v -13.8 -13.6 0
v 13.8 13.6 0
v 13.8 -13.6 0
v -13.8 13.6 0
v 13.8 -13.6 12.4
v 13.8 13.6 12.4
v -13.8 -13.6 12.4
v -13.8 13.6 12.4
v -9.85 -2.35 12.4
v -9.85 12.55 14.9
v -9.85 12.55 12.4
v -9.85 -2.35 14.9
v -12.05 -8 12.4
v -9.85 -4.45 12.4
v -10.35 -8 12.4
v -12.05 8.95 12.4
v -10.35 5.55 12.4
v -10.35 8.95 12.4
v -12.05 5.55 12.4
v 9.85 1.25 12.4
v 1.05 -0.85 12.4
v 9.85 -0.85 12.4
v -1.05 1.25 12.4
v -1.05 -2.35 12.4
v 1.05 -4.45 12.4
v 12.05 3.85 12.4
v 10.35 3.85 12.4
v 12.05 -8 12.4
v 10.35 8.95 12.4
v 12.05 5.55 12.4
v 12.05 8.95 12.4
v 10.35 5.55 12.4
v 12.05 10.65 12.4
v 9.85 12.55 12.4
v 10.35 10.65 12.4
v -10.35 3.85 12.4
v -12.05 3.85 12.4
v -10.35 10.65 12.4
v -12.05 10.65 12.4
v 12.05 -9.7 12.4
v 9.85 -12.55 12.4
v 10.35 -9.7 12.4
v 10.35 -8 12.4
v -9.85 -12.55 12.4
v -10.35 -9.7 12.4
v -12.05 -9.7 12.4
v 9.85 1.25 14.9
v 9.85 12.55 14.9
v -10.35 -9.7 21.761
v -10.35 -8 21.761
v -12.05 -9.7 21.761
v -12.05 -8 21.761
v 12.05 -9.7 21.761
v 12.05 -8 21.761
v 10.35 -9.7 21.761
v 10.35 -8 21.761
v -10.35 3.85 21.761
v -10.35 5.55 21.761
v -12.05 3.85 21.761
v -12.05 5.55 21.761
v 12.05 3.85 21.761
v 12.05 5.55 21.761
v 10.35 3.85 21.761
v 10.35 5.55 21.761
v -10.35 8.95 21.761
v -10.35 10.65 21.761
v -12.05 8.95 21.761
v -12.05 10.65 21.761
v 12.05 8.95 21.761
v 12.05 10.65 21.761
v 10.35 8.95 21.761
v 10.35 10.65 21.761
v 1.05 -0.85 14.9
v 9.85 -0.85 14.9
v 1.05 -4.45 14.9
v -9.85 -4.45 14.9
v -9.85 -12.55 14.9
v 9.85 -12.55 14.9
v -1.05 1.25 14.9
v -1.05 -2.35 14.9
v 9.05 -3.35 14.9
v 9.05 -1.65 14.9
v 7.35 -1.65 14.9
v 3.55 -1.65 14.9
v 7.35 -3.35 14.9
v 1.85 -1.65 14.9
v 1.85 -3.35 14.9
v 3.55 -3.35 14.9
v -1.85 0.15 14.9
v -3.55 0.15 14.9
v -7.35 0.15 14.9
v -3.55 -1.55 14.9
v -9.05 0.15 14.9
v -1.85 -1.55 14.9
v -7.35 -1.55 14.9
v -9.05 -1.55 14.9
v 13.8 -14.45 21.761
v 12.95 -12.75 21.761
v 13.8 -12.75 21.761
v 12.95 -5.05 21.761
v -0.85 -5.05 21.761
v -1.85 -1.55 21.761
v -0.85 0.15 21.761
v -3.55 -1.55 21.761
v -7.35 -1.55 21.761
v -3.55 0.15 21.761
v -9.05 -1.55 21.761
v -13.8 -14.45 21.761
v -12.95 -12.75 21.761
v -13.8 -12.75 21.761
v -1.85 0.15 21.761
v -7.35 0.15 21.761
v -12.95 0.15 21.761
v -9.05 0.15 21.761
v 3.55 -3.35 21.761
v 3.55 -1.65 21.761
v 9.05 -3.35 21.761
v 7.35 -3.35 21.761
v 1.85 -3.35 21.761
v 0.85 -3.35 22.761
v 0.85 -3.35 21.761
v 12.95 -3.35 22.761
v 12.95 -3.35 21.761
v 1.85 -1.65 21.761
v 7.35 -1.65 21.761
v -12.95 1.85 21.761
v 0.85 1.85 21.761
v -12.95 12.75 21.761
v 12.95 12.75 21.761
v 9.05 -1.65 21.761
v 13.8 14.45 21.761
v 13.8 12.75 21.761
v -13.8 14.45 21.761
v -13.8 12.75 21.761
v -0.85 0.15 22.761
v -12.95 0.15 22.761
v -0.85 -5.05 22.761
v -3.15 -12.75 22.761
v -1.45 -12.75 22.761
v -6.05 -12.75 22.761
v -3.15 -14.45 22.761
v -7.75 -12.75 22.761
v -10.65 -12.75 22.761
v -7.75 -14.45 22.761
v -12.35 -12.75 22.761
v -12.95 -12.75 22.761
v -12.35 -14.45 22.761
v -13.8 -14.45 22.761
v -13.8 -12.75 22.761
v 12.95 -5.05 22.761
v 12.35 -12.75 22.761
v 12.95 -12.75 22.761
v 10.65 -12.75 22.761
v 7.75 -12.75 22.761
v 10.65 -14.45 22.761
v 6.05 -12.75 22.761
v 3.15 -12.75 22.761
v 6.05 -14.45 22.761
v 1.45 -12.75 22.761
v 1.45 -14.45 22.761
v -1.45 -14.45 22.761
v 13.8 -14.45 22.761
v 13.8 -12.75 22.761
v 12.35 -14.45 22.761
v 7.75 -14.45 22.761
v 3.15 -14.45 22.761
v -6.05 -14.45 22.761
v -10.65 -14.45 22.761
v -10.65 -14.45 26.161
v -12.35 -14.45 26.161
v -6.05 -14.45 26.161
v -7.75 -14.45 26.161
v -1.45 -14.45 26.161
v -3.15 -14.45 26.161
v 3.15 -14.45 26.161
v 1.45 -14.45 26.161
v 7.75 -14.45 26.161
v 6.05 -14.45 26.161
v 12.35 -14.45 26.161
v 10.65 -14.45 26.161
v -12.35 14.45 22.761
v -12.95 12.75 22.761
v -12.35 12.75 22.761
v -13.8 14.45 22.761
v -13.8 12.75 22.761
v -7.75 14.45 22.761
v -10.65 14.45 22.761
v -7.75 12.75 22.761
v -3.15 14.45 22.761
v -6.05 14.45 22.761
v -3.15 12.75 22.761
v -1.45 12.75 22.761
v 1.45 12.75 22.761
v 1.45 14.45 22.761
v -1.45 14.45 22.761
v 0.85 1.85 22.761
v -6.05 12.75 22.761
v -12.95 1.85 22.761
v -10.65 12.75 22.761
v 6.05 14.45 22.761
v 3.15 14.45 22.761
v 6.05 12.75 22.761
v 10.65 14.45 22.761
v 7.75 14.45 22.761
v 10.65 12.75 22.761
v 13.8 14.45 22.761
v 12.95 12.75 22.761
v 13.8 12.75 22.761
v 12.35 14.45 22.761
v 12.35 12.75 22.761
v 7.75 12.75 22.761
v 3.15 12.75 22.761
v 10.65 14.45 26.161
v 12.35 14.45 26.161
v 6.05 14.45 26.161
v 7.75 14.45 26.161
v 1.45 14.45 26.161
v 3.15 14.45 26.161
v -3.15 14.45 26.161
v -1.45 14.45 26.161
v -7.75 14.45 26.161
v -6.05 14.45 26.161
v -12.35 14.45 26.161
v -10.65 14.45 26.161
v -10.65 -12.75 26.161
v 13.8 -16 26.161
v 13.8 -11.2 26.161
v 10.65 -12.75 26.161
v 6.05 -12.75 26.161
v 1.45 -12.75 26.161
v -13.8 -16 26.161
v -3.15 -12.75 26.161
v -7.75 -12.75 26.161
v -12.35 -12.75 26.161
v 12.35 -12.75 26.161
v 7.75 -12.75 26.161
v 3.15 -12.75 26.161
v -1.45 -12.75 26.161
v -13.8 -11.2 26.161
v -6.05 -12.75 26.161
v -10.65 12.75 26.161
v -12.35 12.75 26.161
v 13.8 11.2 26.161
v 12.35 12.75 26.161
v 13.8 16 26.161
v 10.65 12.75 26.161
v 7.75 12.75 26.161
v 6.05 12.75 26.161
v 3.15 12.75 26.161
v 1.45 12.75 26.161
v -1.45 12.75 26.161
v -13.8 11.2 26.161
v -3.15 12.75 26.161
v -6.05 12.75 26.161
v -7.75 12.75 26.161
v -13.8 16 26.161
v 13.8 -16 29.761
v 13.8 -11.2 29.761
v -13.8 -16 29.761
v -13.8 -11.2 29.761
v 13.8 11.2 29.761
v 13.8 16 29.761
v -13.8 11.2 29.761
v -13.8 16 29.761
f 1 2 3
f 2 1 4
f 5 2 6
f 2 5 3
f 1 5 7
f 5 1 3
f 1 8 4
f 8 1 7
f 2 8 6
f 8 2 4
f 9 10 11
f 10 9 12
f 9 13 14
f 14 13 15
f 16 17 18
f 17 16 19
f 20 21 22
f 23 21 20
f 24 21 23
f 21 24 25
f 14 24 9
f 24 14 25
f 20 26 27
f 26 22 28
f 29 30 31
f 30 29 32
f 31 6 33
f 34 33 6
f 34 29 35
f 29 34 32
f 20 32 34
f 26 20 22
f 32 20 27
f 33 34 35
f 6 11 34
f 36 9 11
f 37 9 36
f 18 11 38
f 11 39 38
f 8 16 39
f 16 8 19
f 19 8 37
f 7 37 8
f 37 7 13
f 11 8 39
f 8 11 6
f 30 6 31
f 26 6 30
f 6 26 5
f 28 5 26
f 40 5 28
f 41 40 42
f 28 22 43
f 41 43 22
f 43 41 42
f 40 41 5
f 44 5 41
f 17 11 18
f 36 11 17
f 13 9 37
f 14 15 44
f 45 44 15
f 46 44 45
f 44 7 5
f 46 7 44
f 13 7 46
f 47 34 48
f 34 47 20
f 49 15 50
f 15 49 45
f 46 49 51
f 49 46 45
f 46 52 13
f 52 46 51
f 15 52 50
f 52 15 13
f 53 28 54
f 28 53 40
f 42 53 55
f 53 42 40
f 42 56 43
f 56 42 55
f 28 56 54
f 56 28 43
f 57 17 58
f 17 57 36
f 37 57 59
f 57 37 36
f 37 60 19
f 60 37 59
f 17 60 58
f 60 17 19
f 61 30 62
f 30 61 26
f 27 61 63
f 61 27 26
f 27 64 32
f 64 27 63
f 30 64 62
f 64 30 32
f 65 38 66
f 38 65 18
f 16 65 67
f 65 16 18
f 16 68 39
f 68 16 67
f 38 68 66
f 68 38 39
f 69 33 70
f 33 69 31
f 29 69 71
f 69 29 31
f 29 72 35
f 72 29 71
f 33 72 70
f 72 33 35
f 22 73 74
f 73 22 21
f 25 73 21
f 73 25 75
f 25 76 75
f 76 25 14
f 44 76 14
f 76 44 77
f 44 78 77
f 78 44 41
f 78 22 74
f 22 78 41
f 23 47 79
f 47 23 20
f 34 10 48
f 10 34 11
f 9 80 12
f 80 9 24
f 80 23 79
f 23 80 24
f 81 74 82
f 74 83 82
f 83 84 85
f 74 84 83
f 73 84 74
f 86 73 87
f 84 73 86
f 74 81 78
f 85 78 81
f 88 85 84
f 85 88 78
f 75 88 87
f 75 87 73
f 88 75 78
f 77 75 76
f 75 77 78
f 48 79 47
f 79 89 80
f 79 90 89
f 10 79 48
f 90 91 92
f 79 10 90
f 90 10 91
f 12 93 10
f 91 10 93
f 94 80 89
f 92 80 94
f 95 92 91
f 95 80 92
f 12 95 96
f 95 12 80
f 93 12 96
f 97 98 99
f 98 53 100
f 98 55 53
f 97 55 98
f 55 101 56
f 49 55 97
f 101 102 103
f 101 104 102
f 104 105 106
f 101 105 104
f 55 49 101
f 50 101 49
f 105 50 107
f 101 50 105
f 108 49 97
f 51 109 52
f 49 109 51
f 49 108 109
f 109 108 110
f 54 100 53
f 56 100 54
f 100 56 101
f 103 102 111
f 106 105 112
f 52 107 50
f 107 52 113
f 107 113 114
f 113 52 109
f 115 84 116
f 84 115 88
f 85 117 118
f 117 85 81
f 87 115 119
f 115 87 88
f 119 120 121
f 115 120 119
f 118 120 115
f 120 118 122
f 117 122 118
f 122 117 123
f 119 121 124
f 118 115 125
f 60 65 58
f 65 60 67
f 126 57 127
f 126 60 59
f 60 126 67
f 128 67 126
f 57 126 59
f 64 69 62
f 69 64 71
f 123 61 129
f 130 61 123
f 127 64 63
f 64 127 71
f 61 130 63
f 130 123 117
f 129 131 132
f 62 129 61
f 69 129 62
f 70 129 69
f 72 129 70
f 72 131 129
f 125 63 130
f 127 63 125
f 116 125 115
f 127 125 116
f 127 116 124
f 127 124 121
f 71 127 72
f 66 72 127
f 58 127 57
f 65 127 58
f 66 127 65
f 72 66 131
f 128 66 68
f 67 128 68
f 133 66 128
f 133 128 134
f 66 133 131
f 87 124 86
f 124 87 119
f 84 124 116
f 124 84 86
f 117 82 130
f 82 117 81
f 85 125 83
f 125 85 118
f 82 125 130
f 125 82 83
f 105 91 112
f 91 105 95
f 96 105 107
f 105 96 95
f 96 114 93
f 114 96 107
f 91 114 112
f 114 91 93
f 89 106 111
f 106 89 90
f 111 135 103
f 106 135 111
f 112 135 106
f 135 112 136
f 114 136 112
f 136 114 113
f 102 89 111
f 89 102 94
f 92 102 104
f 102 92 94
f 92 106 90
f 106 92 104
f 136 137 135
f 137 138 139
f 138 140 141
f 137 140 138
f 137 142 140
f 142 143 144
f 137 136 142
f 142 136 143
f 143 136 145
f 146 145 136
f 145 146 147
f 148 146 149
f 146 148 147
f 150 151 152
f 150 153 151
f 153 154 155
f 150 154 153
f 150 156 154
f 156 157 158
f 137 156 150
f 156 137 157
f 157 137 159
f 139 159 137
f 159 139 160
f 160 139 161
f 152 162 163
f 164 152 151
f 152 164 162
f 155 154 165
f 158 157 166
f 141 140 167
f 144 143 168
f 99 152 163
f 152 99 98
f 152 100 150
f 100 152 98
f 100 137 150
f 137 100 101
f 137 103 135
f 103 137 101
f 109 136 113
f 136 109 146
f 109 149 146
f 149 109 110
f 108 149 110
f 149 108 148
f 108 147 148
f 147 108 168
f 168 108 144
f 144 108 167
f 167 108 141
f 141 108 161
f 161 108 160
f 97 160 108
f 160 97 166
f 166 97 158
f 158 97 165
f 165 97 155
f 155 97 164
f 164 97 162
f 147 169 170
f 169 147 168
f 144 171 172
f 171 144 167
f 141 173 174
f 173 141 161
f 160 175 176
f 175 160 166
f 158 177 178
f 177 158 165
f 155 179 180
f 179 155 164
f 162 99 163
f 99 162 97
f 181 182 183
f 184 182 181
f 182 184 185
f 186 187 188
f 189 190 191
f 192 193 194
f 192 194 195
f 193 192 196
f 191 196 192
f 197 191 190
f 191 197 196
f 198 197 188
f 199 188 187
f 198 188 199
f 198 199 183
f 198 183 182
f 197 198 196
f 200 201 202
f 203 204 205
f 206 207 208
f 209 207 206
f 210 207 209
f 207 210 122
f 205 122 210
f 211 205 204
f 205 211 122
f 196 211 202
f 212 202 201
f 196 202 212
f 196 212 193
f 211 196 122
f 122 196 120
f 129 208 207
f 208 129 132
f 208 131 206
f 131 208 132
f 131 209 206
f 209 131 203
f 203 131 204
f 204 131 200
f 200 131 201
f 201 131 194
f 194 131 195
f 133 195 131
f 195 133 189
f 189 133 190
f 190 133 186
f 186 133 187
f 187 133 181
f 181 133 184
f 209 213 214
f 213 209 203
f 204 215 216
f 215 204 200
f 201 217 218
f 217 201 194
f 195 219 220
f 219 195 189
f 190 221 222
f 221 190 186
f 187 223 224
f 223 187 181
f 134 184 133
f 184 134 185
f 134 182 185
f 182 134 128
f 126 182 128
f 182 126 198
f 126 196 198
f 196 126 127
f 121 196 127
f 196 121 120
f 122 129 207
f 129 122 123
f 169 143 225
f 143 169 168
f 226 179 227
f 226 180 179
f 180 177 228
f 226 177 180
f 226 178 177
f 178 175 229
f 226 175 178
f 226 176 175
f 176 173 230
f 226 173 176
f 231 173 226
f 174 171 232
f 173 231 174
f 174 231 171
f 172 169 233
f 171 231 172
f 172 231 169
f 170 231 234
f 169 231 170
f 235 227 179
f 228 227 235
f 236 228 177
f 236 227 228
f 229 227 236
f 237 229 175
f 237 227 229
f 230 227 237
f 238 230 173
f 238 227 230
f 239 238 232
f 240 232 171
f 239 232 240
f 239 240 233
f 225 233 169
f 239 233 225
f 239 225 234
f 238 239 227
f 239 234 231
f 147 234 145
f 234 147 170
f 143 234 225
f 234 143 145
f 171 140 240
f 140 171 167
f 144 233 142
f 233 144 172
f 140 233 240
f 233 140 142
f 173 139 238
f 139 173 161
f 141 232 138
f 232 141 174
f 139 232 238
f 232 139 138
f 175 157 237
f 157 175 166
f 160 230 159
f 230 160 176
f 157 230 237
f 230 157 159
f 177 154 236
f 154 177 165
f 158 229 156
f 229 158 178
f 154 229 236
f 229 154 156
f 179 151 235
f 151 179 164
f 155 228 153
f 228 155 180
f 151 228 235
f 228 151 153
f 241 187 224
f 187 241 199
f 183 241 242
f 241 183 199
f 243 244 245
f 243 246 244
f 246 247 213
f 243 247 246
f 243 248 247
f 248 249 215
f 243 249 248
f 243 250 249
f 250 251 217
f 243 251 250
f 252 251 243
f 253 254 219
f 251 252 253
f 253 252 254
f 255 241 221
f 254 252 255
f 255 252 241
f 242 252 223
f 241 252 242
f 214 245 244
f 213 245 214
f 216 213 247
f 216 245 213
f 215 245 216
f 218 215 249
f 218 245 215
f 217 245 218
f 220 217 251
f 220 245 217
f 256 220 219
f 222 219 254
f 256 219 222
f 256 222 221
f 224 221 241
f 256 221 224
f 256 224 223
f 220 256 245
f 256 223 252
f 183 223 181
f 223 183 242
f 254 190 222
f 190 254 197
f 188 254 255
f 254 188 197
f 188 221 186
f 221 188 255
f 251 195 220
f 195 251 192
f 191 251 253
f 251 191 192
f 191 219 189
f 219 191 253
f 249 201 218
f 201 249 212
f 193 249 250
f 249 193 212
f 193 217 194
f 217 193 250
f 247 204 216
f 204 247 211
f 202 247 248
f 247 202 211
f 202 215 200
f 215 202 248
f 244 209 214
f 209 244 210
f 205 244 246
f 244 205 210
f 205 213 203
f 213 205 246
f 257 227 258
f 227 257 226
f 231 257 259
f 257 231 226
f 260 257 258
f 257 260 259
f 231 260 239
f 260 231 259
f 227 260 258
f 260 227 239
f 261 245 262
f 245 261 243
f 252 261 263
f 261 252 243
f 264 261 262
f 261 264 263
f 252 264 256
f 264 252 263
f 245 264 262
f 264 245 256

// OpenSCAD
// Generated by SolidPython 0.4.2 on 2020-09-29 23:20:26
//!OpenSCAD

scale(v = 0.0100000000) {
	translate(v = [-1380, -1360, 0]) {
		union() {
			color(c = [0.4000000000, 0.4000000000, 0.4000000000]) {
				translate(v = [0, 0, 0]) {
					linear_extrude(height = 1000.0000000000) {
						polygon(paths = [[0, 1, 2, 3]], points = [[0, 0], [0, 2720], [2760, 2720], [2760, 0]]);
					}
				}
			}
			color(c = [0.2000000000, 0.6000000000, 0.2000000000]) {
				translate(v = [0, 0, 1000.0000000000]) {
					linear_extrude(height = 120.0000000000) {
						polygon(paths = [[0, 1, 2, 3]], points = [[0, 1305], [0, 2720], [2760, 2720], [2760, 1305]]);
					}
				}
			}
			color(c = [0.4000000000, 0.4000000000, 0.4000000000]) {
				translate(v = [0, 0, 1000.0000000000]) {
					linear_extrude(height = 120.0000000000) {
						polygon(paths = [[0, 1, 2, 3]], points = [[0, 0], [0, 1305], [2760, 1305], [2760, 0]]);
					}
				}
			}
			color(c = [0.9000000000, 0.6000000000, 0.6000000000]) {
				translate(v = [0, 0, 1120.0000000000]) {
					linear_extrude(height = 120.0000000000) {
						polygon(paths = [[0, 1, 2, 3]], points = [[135, 1615], [135, 2485], [395, 2485], [395, 1615]]);
					}
				}
			}
			color(c = [0.9000000000, 0.6000000000, 0.6000000000]) {
				translate(v = [0, 0, 1120.0000000000]) {
					linear_extrude(height = 120.0000000000) {
						polygon(paths = [[0, 1, 2, 3]], points = [[2365, 1615], [2365, 2485], [2625, 2485], [2625, 1615]]);
					}
				}
			}
			color(c = [0.9000000000, 0.6000000000, 0.9000000000]) {
				translate(v = [0, 0, 1120.0000000000]) {
					linear_extrude(height = 120.0000000000) {
						polygon(paths = [[0, 1, 2, 3]], points = [[135, 235], [135, 785], [395, 785], [395, 235]]);
					}
				}
			}
			color(c = [0.9000000000, 0.6000000000, 0.9000000000]) {
				translate(v = [0, 0, 1120.0000000000]) {
					linear_extrude(height = 120.0000000000) {
						polygon(paths = [[0, 1, 2, 3]], points = [[2365, 235], [2365, 785], [2625, 785], [2625, 235]]);
					}
				}
			}
			color(c = [0.2000000000, 0.6000000000, 0.2000000000]) {
				translate(v = [0, 0, 1120.0000000000]) {
					linear_extrude(height = 120.0000000000) {
						difference() {
							polygon(paths = [[0, 1, 2, 3]], points = [[0, 1305], [0, 2720], [2760, 2720], [2760, 1305]]);
							polygon(paths = [[0, 1, 2, 3]], points = [[135, 1615], [395, 1615], [395, 2485], [135, 2485]]);
							polygon(paths = [[0, 1, 2, 3]], points = [[2365, 1615], [2625, 1615], [2625, 2485], [2365, 2485]]);
						}
					}
				}
			}
			color(c = [0.4000000000, 0.4000000000, 0.4000000000]) {
				translate(v = [0, 0, 1120.0000000000]) {
					linear_extrude(height = 120.0000000000) {
						difference() {
							polygon(paths = [[0, 1, 2, 3]], points = [[0, 0], [0, 1305], [2760, 1305], [2760, 0]]);
							polygon(paths = [[0, 1, 2, 3]], points = [[135, 235], [395, 235], [395, 785], [135, 785]]);
							polygon(paths = [[0, 1, 2, 3]], points = [[2365, 235], [2625, 235], [2625, 785], [2365, 785]]);
						}
					}
				}
			}
			color(c = [0.1000000000, 0.1000000000, 0.1000000000]) {
				translate(v = [0, 0, 1240.0000000000]) {
					linear_extrude(height = 70.0000000000) {
						polygon(paths = [[0, 1, 2, 3]], points = [[175, 390], [175, 560], [345, 560], [345, 390]]);
					}
				}
			}
			color(c = [0.1000000000, 0.1000000000, 0.1000000000]) {
				translate(v = [0, 0, 1240.0000000000]) {
					linear_extrude(height = 70.0000000000) {
						polygon(paths = [[0, 1, 2, 3]], points = [[2415, 390], [2415, 560], [2585, 560], [2585, 390]]);
					}
				}
			}
			color(c = [0.1000000000, 0.1000000000, 0.1000000000]) {
				translate(v = [0, 0, 1240.0000000000]) {
					linear_extrude(height = 70.0000000000) {
						polygon(paths = [[0, 1, 2, 3]], points = [[175, 1745], [175, 1915], [345, 1915], [345, 1745]]);
					}
				}
			}
			color(c = [0.1000000000, 0.1000000000, 0.1000000000]) {
				translate(v = [0, 0, 1240.0000000000]) {
					linear_extrude(height = 70.0000000000) {
						polygon(paths = [[0, 1, 2, 3]], points = [[2415, 1745], [2415, 1915], [2585, 1915], [2585, 1745]]);
					}
				}
			}
			color(c = [0.1000000000, 0.1000000000, 0.1000000000]) {
				translate(v = [0, 0, 1240.0000000000]) {
					linear_extrude(height = 70.0000000000) {
						polygon(paths = [[0, 1, 2, 3]], points = [[175, 2255], [175, 2425], [345, 2425], [345, 2255]]);
					}
				}
			}
			color(c = [0.1000000000, 0.1000000000, 0.1000000000]) {
				translate(v = [0, 0, 1240.0000000000]) {
					linear_extrude(height = 70.0000000000) {
						polygon(paths = [[0, 1, 2, 3]], points = [[2415, 2255], [2415, 2425], [2585, 2425], [2585, 2255]]);
					}
				}
			}
			color(c = [1.0000000000, 1.0000000000, 1.0000000000]) {
				translate(v = [0, 0, 1240.0000000000]) {
					linear_extrude(height = 70.0000000000) {
						polygon(paths = [[0, 1, 2, 3, 4, 5]], points = [[395, 105], [395, 915], [1485, 915], [1485, 1275], [2365, 1275], [2365, 105]]);
					}
				}
			}
			color(c = [1.0000000000, 1.0000000000, 1.0000000000]) {
				translate(v = [0, 0, 1240.0000000000]) {
					linear_extrude(height = 70.0000000000) {
						polygon(paths = [[0, 1, 2, 3, 4, 5]], points = [[395, 1125], [395, 2615], [2365, 2615], [2365, 1485], [1275, 1485], [1275, 1125]]);
					}
				}
			}
			color(c = [0.1000000000, 0.1000000000, 0.1000000000]) {
				translate(v = [0, 0, 1310.0000000000]) {
					linear_extrude(height = 180.0000000000) {
						polygon(paths = [[0, 1, 2, 3]], points = [[175, 390], [175, 560], [345, 560], [345, 390]]);
					}
				}
			}
			color(c = [0.1000000000, 0.1000000000, 0.1000000000]) {
				translate(v = [0, 0, 1310.0000000000]) {
					linear_extrude(height = 180.0000000000) {
						polygon(paths = [[0, 1, 2, 3]], points = [[2415, 390], [2415, 560], [2585, 560], [2585, 390]]);
					}
				}
			}
			color(c = [0.1000000000, 0.1000000000, 0.1000000000]) {
				translate(v = [0, 0, 1310.0000000000]) {
					linear_extrude(height = 180.0000000000) {
						polygon(paths = [[0, 1, 2, 3]], points = [[175, 1745], [175, 1915], [345, 1915], [345, 1745]]);
					}
				}
			}
			color(c = [0.1000000000, 0.1000000000, 0.1000000000]) {
				translate(v = [0, 0, 1310.0000000000]) {
					linear_extrude(height = 180.0000000000) {
						polygon(paths = [[0, 1, 2, 3]], points = [[2415, 1745], [2415, 1915], [2585, 1915], [2585, 1745]]);
					}
				}
			}
			color(c = [0.1000000000, 0.1000000000, 0.1000000000]) {
				translate(v = [0, 0, 1310.0000000000]) {
					linear_extrude(height = 180.0000000000) {
						polygon(paths = [[0, 1, 2, 3]], points = [[175, 2255], [175, 2425], [345, 2425], [345, 2255]]);
					}
				}
			}
			color(c = [0.1000000000, 0.1000000000, 0.1000000000]) {
				translate(v = [0, 0, 1310.0000000000]) {
					linear_extrude(height = 180.0000000000) {
						polygon(paths = [[0, 1, 2, 3]], points = [[2415, 2255], [2415, 2425], [2585, 2425], [2585, 2255]]);
					}
				}
			}
			color(c = [0.7000000000, 0, 0]) {
				translate(v = [0, 0, 1310.0000000000]) {
					linear_extrude(height = 180.0000000000) {
						polygon(paths = [[0, 1, 2, 3, 4, 5]], points = [[395, 105], [395, 915], [1485, 915], [1485, 1275], [2365, 1275], [2365, 105]]);
					}
				}
			}
			color(c = [0.7000000000, 0, 0]) {
				translate(v = [0, 0, 1310.0000000000]) {
					linear_extrude(height = 180.0000000000) {
						polygon(paths = [[0, 1, 2, 3, 4, 5]], points = [[395, 1125], [395, 2615], [2365, 2615], [2365, 1485], [1275, 1485], [1275, 1125]]);
					}
				}
			}
			color(c = [0.1000000000, 0.1000000000, 0.1000000000]) {
				translate(v = [0, 0, 1490.0000000000]) {
					linear_extrude(height = 686.1000000000) {
						polygon(paths = [[0, 1, 2, 3]], points = [[175, 390], [175, 560], [345, 560], [345, 390]]);
					}
				}
			}
			color(c = [0.1000000000, 0.1000000000, 0.1000000000]) {
				translate(v = [0, 0, 1490.0000000000]) {
					linear_extrude(height = 686.1000000000) {
						polygon(paths = [[0, 1, 2, 3]], points = [[2415, 390], [2415, 560], [2585, 560], [2585, 390]]);
					}
				}
			}
			color(c = [0.1000000000, 0.1000000000, 0.1000000000]) {
				translate(v = [0, 0, 1490.0000000000]) {
					linear_extrude(height = 686.1000000000) {
						polygon(paths = [[0, 1, 2, 3]], points = [[1565, 1025], [1565, 1195], [1735, 1195], [1735, 1025]]);
					}
				}
			}
			color(c = [0.1000000000, 0.1000000000, 0.1000000000]) {
				translate(v = [0, 0, 1490.0000000000]) {
					linear_extrude(height = 686.1000000000) {
						polygon(paths = [[0, 1, 2, 3]], points = [[2115, 1025], [2115, 1195], [2285, 1195], [2285, 1025]]);
					}
				}
			}
			color(c = [0.1000000000, 0.1000000000, 0.1000000000]) {
				translate(v = [0, 0, 1490.0000000000]) {
					linear_extrude(height = 686.1000000000) {
						polygon(paths = [[0, 1, 2, 3]], points = [[475, 1205], [475, 1375], [645, 1375], [645, 1205]]);
					}
				}
			}
			color(c = [0.1000000000, 0.1000000000, 0.1000000000]) {
				translate(v = [0, 0, 1490.0000000000]) {
					linear_extrude(height = 686.1000000000) {
						polygon(paths = [[0, 1, 2, 3]], points = [[1025, 1205], [1025, 1375], [1195, 1375], [1195, 1205]]);
					}
				}
			}
			color(c = [0.1000000000, 0.1000000000, 0.1000000000]) {
				translate(v = [0, 0, 1490.0000000000]) {
					linear_extrude(height = 686.1000000000) {
						polygon(paths = [[0, 1, 2, 3]], points = [[175, 1745], [175, 1915], [345, 1915], [345, 1745]]);
					}
				}
			}
			color(c = [0.1000000000, 0.1000000000, 0.1000000000]) {
				translate(v = [0, 0, 1490.0000000000]) {
					linear_extrude(height = 686.1000000000) {
						polygon(paths = [[0, 1, 2, 3]], points = [[2415, 1745], [2415, 1915], [2585, 1915], [2585, 1745]]);
					}
				}
			}
			color(c = [0.1000000000, 0.1000000000, 0.1000000000]) {
				translate(v = [0, 0, 1490.0000000000]) {
					linear_extrude(height = 686.1000000000) {
						polygon(paths = [[0, 1, 2, 3]], points = [[175, 2255], [175, 2425], [345, 2425], [345, 2255]]);
					}
				}
			}
			color(c = [0.1000000000, 0.1000000000, 0.1000000000]) {
				translate(v = [0, 0, 1490.0000000000]) {
					linear_extrude(height = 686.1000000000) {
						polygon(paths = [[0, 1, 2, 3]], points = [[2415, 2255], [2415, 2425], [2585, 2425], [2585, 2255]]);
					}
				}
			}
			color(c = [0.9000000000, 0.6000000000, 0.6000000000]) {
				translate(v = [0, 0, 2176.1000000000]) {
					linear_extrude(height = 100.0000000000) {
						polygon(paths = [[0, 1, 2, 3, 4, 5, 6, 7, 8, 9]], points = [[0, -85], [0, 85], [85, 85], [85, 1375], [1295, 1375], [1295, 855], [2675, 855], [2675, 85], [2760, 85], [2760, -85]]);
					}
				}
			}
			color(c = [0.9000000000, 0.6000000000, 0.6000000000]) {
				translate(v = [0, 0, 2176.1000000000]) {
					linear_extrude(height = 100.0000000000) {
						polygon(paths = [[0, 1, 2, 3, 4, 5, 6, 7, 8, 9]], points = [[1465, 1025], [1465, 1545], [85, 1545], [85, 2635], [0, 2635], [0, 2805], [2760, 2805], [2760, 2635], [2675, 2635], [2675, 1025]]);
					}
				}
			}
			color(c = [0.5000000000, 0.5000000000, 0.5000000000]) {
				translate(v = [0, 0, 2276.1000000000]) {
					linear_extrude(height = 340.0000000000) {
						polygon(paths = [[0, 1, 2, 3]], points = [[145, -85], [145, 85], [315, 85], [315, -85]]);
					}
				}
			}
			color(c = [0.5000000000, 0.5000000000, 0.5000000000]) {
				translate(v = [0, 0, 2276.1000000000]) {
					linear_extrude(height = 340.0000000000) {
						polygon(paths = [[0, 1, 2, 3]], points = [[605, -85], [605, 85], [775, 85], [775, -85]]);
					}
				}
			}
			color(c = [0.5000000000, 0.5000000000, 0.5000000000]) {
				translate(v = [0, 0, 2276.1000000000]) {
					linear_extrude(height = 340.0000000000) {
						polygon(paths = [[0, 1, 2, 3]], points = [[1065, -85], [1065, 85], [1235, 85], [1235, -85]]);
					}
				}
			}
			color(c = [0.5000000000, 0.5000000000, 0.5000000000]) {
				translate(v = [0, 0, 2276.1000000000]) {
					linear_extrude(height = 340.0000000000) {
						polygon(paths = [[0, 1, 2, 3]], points = [[1525, -85], [1525, 85], [1695, 85], [1695, -85]]);
					}
				}
			}
			color(c = [0.5000000000, 0.5000000000, 0.5000000000]) {
				translate(v = [0, 0, 2276.1000000000]) {
					linear_extrude(height = 340.0000000000) {
						polygon(paths = [[0, 1, 2, 3]], points = [[1985, -85], [1985, 85], [2155, 85], [2155, -85]]);
					}
				}
			}
			color(c = [0.5000000000, 0.5000000000, 0.5000000000]) {
				translate(v = [0, 0, 2276.1000000000]) {
					linear_extrude(height = 340.0000000000) {
						polygon(paths = [[0, 1, 2, 3]], points = [[2445, -85], [2445, 85], [2615, 85], [2615, -85]]);
					}
				}
			}
			color(c = [0.5000000000, 0.5000000000, 0.5000000000]) {
				translate(v = [0, 0, 2276.1000000000]) {
					linear_extrude(height = 340.0000000000) {
						polygon(paths = [[0, 1, 2, 3]], points = [[145, 2635], [145, 2805], [315, 2805], [315, 2635]]);
					}
				}
			}
			color(c = [0.5000000000, 0.5000000000, 0.5000000000]) {
				translate(v = [0, 0, 2276.1000000000]) {
					linear_extrude(height = 340.0000000000) {
						polygon(paths = [[0, 1, 2, 3]], points = [[605, 2635], [605, 2805], [775, 2805], [775, 2635]]);
					}
				}
			}
			color(c = [0.5000000000, 0.5000000000, 0.5000000000]) {
				translate(v = [0, 0, 2276.1000000000]) {
					linear_extrude(height = 340.0000000000) {
						polygon(paths = [[0, 1, 2, 3]], points = [[1065, 2635], [1065, 2805], [1235, 2805], [1235, 2635]]);
					}
				}
			}
			color(c = [0.5000000000, 0.5000000000, 0.5000000000]) {
				translate(v = [0, 0, 2276.1000000000]) {
					linear_extrude(height = 340.0000000000) {
						polygon(paths = [[0, 1, 2, 3]], points = [[1525, 2635], [1525, 2805], [1695, 2805], [1695, 2635]]);
					}
				}
			}
			color(c = [0.5000000000, 0.5000000000, 0.5000000000]) {
				translate(v = [0, 0, 2276.1000000000]) {
					linear_extrude(height = 340.0000000000) {
						polygon(paths = [[0, 1, 2, 3]], points = [[1985, 2635], [1985, 2805], [2155, 2805], [2155, 2635]]);
					}
				}
			}
			color(c = [0.5000000000, 0.5000000000, 0.5000000000]) {
				translate(v = [0, 0, 2276.1000000000]) {
					linear_extrude(height = 340.0000000000) {
						polygon(paths = [[0, 1, 2, 3]], points = [[2445, 2635], [2445, 2805], [2615, 2805], [2615, 2635]]);
					}
				}
			}
			color(c = [0.3000000000, 0.3000000000, 1]) {
				translate(v = [0, 0, 2616.1000000000]) {
					linear_extrude(height = 360.0000000000) {
						polygon(paths = [[0, 1, 2, 3]], points = [[0, -240], [0, 240], [2760, 240], [2760, -240]]);
					}
				}
			}
			color(c = [0.3000000000, 0.3000000000, 1]) {
				translate(v = [0, 0, 2616.1000000000]) {
					linear_extrude(height = 360.0000000000) {
						polygon(paths = [[0, 1, 2, 3]], points = [[0, 2480], [0, 2960], [2760, 2960], [2760, 2480]]);
					}
				}
			}
		}
	}
}
